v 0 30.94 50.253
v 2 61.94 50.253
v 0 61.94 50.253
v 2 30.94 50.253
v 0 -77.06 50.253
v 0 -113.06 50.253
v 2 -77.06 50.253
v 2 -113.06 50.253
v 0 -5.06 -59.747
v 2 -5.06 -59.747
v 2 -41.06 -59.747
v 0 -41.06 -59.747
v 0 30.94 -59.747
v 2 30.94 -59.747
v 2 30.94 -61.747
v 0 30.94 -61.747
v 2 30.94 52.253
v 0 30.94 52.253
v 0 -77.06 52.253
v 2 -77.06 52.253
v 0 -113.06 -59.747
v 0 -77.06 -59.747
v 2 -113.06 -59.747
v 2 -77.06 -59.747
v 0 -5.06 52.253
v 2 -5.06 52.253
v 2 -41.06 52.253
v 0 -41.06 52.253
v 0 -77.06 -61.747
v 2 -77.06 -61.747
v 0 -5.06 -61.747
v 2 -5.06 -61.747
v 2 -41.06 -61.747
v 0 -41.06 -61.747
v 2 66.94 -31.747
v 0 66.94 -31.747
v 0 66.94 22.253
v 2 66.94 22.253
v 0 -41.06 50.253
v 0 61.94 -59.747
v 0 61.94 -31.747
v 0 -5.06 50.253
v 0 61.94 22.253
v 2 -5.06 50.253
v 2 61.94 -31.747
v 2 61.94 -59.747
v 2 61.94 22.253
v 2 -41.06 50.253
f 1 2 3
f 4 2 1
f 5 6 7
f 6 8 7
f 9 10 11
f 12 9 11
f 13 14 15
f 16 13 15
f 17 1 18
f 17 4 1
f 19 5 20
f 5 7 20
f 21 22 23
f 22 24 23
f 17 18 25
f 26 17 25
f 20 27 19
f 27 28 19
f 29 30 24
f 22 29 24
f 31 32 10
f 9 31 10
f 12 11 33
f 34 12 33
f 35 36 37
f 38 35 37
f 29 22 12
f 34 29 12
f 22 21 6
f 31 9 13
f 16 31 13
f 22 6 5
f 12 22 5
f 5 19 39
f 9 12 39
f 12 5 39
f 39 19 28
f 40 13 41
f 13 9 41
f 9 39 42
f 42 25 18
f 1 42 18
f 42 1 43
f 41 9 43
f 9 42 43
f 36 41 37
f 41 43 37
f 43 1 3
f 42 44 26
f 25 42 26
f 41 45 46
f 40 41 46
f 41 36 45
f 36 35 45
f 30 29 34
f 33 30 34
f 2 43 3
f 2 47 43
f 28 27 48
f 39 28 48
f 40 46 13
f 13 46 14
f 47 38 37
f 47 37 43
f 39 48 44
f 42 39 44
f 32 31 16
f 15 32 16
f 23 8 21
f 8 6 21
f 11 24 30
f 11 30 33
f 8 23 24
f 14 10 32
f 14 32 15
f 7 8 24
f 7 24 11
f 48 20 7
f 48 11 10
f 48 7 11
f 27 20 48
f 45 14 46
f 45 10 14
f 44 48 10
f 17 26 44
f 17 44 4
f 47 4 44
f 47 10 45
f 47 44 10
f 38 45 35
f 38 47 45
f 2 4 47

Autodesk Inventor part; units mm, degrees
ref_plane "YZ Plane" through (0, 0, 0) normal (1, 0, 0) x (0, 1, 0)
ref_plane "XZ Plane" through (0, 0, 0) normal (0, 1, 0) x (-1, 0, 0)
ref_plane "XY Plane" through (0, 0, 0) normal (0, 0, 1) x (1, 0, 0)
sketch "Sketch1" plane through (0, 0, 0) normal (1, 0, 0) x (0, 1, 0)
  line L0 (66.9402, 52.2533) -> (-113.0598, 52.2533)
  line L1 (-113.0598, 52.2533) -> (-113.0598, -61.7467)
  line L2 (-113.0598, -61.7467) -> (66.9402, -61.7467)
  line L3 (66.9402, -61.7467) -> (66.9402, 52.2533)
  point P0 (0, 0)
  dimension "d0" = 114
  dimension "d1" = 180
extrude "Extrusion1" add sketch "Sketch1" along normal blind 2
sketch "Sketch2" plane through (2, 0, 0) normal (1, 0, 0) x (0, 0, -1)
  line L0 (61.7467, 66.9402) -> (-52.2533, 66.9402) projected
  line L1 (-52.2533, 66.9402) -> (-22.2533, 66.9402)
  line L2 (-22.2533, 66.9402) -> (-22.2533, 61.9402)
  line L3 (-22.2533, 61.9402) -> (-52.2533, 61.9402)
  line L4 (-52.2533, 61.9402) -> (-52.2533, 66.9402)
  line L5 (61.7467, 66.9402) -> (31.7467, 66.9402)
  line L6 (31.7467, 66.9402) -> (31.7467, 61.9402)
  line L7 (31.7467, 61.9402) -> (61.7467, 61.9402)
  line L8 (61.7467, 61.9402) -> (61.7467, 66.9402)
  point P0 (0, 0)
  point P1 (31.7467, 66.9402)
  dimension "d4" = 30
  dimension "d5" = 30
  dimension "d6" = 5
extrude "Extrusion2" cut sketch "Sketch2" against normal blind 2
sketch "Sketch3" plane through (2, 0, 0) normal (1, 0, 0) x (0, 0, -1)
  line L0 (-52.2533, 61.9402) -> (-52.2533, -113.0598) projected
  line L1 (-52.2533, -113.0598) -> (-50.2533, -113.0598)
  line L2 (-50.2533, -113.0598) -> (-50.2533, -77.0598)
  line L3 (-50.2533, -77.0598) -> (-52.2533, -77.0598)
  line L4 (-52.2533, -77.0598) -> (-52.2533, -113.0598)
  line L5 (-52.2533, -41.0598) -> (-50.2533, -41.0598)
  line L6 (-50.2533, -41.0598) -> (-50.2533, -5.0598)
  line L7 (-50.2533, -5.0598) -> (-52.2533, -5.0598)
  line L8 (-52.2533, -5.0598) -> (-52.2533, -41.0598)
  line L9 (-52.2533, 61.9402) -> (-50.2533, 61.9402)
  line L10 (-50.2533, 61.9402) -> (-50.2533, 30.9402)
  line L11 (-50.2533, 30.9402) -> (-52.2533, 30.9402)
  line L12 (-52.2533, 30.9402) -> (-52.2533, 61.9402)
  line L13 (61.7467, 61.9402) -> (31.7467, 61.9402) projected
  line L14 (61.7467, 61.9402) -> (59.7467, 61.9402)
  line L15 (59.7467, 61.9402) -> (59.7467, 30.9402)
  line L16 (59.7467, 30.9402) -> (61.7467, 30.9402)
  line L17 (61.7467, 30.9402) -> (61.7467, 61.9402)
  line L18 (61.7467, -113.0598) -> (61.7467, 61.9402) projected
  line L19 (61.7467, -5.0598) -> (59.7467, -5.0598)
  line L20 (59.7467, -5.0598) -> (59.7467, -41.0598)
  line L21 (59.7467, -41.0598) -> (61.7467, -41.0598)
  line L22 (61.7467, -41.0598) -> (61.7467, -5.0598)
  line L23 (-52.2533, -113.0598) -> (61.7467, -113.0598) projected
  line L24 (61.7467, -77.0598) -> (59.7467, -77.0598)
  line L25 (59.7467, -77.0598) -> (59.7467, -113.0598)
  line L26 (59.7467, -113.0598) -> (61.7467, -113.0598)
  line L27 (61.7467, -113.0598) -> (61.7467, -77.0598)
  point P0 (0, 0)
  point P1 (60.7467, -77.0598)
  point P2 (60.7467, -41.0598)
  point P3 (60.7467, -5.0598)
  point P4 (60.7467, 30.9402)
  point P5 (61.7467, -41.0598)
  dimension "d9" = 2
  dimension "d10" = 2
  dimension "d11" = 36
  dimension "d12" = 36
  dimension "d13" = 36
  dimension "d14" = 36
  dimension "d15" = 36
extrude "Extrusion3" cut sketch "Sketch3" against normal blind 2
properties part number "inner_side"
